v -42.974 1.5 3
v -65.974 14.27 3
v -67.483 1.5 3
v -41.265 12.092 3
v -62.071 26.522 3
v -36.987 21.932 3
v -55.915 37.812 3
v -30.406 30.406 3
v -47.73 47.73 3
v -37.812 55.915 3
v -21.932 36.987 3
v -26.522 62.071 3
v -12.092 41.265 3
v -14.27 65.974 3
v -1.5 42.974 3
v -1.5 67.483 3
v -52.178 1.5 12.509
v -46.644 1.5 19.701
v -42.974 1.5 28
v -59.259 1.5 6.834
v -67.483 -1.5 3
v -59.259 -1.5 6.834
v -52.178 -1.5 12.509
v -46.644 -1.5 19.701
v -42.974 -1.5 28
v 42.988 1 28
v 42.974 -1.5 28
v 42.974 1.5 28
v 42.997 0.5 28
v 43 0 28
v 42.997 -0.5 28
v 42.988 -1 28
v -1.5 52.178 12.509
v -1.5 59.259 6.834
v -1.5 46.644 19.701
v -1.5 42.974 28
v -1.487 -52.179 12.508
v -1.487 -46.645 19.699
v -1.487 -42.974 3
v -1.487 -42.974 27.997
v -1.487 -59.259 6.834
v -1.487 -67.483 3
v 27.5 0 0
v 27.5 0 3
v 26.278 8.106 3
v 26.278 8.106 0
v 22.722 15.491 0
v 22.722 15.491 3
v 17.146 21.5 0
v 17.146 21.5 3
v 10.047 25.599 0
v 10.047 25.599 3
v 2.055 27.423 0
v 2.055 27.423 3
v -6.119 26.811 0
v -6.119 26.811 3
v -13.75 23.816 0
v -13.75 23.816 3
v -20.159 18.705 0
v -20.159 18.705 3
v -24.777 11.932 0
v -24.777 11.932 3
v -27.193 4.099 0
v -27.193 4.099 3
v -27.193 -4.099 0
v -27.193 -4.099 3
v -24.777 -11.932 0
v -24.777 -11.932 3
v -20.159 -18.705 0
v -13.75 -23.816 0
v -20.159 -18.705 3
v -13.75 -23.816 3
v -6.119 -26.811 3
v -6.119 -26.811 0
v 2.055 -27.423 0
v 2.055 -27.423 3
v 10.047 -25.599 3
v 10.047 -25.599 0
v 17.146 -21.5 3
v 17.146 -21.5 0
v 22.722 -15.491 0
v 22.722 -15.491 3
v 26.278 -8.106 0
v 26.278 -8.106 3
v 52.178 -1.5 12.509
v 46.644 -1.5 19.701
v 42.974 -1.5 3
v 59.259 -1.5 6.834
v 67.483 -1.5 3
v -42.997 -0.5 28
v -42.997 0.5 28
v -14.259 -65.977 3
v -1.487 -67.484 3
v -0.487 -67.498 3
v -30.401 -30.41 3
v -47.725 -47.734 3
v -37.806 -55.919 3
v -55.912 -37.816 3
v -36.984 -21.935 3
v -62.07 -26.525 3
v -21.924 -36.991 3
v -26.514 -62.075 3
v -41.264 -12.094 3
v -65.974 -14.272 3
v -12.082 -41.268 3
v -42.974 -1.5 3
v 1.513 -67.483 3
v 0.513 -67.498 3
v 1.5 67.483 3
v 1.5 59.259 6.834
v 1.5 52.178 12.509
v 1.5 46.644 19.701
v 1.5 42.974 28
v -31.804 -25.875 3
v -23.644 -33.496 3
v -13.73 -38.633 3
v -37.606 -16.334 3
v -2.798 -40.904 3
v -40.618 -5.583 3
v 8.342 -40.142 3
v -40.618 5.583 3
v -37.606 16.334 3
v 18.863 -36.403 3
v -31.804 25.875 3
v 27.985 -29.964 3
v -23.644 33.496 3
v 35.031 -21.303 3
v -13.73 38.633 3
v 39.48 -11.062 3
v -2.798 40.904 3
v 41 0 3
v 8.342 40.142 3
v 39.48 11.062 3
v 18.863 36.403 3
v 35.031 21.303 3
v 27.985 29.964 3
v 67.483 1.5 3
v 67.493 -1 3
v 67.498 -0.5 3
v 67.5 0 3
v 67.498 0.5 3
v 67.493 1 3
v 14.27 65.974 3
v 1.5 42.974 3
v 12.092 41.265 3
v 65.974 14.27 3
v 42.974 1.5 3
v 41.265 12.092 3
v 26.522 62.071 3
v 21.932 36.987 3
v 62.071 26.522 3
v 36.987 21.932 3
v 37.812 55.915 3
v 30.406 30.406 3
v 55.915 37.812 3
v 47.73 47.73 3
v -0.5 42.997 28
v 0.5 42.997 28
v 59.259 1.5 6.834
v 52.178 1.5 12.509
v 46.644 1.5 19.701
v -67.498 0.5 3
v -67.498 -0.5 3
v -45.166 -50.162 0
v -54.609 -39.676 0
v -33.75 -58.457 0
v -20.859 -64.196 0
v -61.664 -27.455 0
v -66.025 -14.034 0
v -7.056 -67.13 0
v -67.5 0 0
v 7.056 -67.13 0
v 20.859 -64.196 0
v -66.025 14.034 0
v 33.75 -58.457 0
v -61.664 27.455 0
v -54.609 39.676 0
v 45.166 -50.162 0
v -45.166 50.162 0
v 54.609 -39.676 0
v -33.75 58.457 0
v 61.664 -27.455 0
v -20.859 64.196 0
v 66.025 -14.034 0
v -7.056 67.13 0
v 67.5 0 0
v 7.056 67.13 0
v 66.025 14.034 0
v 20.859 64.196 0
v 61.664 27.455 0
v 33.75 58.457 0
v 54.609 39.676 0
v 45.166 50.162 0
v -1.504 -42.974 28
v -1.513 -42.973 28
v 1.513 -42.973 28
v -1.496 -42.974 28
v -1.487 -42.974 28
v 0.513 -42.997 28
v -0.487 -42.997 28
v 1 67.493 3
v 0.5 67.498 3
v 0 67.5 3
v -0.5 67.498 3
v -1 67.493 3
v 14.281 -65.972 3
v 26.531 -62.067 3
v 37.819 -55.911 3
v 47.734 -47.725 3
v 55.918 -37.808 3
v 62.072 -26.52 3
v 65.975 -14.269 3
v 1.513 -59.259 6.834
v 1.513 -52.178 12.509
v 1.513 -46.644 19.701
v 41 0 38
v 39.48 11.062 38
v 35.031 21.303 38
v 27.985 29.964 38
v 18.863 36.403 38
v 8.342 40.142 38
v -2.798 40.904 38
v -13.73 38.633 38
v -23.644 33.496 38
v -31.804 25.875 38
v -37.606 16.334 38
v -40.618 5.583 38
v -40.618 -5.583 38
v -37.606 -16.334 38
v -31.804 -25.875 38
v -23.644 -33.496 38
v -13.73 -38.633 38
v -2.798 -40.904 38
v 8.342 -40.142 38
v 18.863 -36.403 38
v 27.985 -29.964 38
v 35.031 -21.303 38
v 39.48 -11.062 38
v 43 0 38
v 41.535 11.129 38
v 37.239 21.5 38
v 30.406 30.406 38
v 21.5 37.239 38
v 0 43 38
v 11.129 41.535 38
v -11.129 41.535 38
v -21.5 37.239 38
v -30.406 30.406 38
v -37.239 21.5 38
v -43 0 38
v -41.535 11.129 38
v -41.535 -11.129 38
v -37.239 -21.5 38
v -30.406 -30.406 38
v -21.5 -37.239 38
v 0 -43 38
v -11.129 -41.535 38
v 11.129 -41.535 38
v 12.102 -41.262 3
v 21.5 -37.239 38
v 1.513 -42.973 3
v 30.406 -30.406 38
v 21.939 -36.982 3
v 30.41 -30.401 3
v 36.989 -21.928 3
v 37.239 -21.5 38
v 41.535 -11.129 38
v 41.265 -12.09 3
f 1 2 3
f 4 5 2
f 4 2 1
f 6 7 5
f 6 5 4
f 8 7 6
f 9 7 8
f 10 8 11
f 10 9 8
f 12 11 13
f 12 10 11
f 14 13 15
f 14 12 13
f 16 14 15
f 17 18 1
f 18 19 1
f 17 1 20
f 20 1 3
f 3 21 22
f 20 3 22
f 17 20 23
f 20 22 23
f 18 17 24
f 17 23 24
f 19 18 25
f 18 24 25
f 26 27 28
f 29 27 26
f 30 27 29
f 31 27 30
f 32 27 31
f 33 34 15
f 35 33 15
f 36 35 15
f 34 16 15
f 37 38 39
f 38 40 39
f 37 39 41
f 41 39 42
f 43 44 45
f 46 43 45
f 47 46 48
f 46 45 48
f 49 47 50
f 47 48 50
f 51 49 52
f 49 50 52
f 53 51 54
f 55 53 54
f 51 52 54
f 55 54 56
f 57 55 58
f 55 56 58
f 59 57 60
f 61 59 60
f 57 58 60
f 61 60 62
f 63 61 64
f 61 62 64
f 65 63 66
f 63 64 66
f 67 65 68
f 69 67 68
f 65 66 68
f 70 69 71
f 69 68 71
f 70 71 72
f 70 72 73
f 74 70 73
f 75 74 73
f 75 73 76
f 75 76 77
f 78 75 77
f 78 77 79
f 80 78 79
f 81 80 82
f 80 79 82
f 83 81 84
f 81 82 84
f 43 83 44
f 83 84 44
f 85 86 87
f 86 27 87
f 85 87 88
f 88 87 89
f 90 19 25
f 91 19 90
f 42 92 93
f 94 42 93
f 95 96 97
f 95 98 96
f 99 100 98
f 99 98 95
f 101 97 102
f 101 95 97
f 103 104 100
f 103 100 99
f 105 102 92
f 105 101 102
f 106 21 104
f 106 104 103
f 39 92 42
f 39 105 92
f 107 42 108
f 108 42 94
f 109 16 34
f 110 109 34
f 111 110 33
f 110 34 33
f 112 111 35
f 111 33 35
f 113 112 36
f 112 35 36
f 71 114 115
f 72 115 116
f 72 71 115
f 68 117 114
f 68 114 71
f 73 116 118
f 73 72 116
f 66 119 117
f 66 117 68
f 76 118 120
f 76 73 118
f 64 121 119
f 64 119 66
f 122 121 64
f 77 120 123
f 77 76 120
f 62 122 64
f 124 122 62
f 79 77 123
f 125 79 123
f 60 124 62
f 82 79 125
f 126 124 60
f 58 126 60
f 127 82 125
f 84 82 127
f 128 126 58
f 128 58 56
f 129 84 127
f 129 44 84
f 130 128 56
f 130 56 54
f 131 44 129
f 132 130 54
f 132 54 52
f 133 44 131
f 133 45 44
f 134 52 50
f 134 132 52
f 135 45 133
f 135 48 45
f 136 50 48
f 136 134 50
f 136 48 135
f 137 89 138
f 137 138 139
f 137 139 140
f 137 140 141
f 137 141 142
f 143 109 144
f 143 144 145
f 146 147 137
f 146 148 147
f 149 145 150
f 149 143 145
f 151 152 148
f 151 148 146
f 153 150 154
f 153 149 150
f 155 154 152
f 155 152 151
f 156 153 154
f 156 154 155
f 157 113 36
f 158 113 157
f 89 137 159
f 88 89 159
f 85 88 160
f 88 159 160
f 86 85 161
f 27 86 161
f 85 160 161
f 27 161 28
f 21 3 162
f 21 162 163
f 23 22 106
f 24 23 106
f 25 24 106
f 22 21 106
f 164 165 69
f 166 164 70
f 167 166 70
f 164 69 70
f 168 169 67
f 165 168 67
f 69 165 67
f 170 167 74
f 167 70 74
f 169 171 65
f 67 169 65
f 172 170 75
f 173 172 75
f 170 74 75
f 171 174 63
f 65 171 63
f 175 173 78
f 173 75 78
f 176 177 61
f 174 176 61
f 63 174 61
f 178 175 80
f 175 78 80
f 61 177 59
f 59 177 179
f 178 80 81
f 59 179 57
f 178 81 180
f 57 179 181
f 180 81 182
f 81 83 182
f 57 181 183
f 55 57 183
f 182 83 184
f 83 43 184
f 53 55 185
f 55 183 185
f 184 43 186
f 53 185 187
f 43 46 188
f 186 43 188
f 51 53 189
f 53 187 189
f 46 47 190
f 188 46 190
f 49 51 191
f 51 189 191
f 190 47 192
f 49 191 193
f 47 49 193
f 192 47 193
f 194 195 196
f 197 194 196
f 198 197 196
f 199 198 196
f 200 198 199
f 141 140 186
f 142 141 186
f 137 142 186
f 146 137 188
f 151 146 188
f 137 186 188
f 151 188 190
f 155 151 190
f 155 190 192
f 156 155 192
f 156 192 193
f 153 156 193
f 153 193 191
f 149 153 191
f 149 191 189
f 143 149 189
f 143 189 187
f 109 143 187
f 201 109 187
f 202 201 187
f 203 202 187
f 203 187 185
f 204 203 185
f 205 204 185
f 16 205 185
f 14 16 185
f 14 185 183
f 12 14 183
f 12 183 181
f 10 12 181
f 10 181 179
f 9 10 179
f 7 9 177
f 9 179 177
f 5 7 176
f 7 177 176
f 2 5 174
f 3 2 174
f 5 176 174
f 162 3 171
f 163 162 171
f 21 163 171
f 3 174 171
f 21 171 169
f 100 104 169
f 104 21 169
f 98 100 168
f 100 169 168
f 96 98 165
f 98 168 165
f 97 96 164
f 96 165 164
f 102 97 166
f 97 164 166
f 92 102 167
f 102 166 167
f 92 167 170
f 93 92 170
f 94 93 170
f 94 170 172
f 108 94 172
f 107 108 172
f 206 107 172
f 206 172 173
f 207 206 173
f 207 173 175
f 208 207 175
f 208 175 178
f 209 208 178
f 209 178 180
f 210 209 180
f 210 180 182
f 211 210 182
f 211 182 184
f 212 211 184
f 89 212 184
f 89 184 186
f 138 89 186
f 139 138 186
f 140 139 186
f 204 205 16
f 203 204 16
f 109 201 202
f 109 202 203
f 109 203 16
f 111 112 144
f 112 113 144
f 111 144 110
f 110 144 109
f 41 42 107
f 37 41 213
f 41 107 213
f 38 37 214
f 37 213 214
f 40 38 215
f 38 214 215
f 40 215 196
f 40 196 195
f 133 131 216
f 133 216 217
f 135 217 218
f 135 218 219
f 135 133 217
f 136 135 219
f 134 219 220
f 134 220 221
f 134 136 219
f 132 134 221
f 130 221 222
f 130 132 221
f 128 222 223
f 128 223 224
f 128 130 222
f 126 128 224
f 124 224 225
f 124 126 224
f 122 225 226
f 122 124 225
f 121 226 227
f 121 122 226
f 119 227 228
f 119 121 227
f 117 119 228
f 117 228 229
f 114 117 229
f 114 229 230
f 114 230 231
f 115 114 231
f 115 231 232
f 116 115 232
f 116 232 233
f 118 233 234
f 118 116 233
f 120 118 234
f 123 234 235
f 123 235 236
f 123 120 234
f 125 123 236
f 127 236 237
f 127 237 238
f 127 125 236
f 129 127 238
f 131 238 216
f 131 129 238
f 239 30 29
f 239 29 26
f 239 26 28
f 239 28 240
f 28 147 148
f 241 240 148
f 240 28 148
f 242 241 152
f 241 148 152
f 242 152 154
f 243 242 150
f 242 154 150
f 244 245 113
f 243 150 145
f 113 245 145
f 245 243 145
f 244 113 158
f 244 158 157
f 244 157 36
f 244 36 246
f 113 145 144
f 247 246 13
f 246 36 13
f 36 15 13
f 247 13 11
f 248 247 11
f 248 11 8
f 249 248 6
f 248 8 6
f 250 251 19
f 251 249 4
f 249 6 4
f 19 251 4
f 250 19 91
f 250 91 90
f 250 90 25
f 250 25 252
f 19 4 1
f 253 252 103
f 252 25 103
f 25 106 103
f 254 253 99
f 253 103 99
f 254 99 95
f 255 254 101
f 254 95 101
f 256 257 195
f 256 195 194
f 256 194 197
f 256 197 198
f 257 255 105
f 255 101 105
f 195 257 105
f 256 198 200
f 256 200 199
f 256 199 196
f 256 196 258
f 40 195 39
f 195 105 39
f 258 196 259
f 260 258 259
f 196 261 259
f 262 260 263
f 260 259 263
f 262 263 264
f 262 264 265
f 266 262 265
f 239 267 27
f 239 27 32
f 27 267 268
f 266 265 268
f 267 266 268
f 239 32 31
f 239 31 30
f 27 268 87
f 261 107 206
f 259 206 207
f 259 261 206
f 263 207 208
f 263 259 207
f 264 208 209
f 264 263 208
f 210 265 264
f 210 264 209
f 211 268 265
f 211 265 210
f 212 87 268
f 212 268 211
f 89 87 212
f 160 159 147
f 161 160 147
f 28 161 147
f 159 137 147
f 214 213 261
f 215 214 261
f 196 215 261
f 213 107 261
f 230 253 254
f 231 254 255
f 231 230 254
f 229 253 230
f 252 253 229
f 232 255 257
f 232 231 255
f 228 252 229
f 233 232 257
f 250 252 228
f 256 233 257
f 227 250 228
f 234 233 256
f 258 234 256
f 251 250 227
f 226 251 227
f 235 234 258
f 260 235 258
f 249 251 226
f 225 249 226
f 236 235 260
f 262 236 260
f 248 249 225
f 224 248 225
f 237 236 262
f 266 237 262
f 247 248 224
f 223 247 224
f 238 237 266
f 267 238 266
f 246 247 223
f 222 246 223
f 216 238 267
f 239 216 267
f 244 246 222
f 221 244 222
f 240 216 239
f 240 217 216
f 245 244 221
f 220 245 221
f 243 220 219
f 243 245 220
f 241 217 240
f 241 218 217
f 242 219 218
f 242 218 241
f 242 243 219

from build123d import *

# Parameters (mm, degrees)
F0_R      = 67.5
F1_DEPTH  = 3
F2_R      = 43
F2_R_2    = 41
F3_DEPTH  = 35
F4_R      = 27.5
F5_DEPTH  = 3
F7_DEPTH  = 25
F12_DEPTH = 25
F13_DEPTH = 25
F14_DEPTH = 25
F15_DEPTH = 25
F16_DEPTH = 25


with BuildPart() as f1:
    # F0 (on Top) → F1 (new body)
    with BuildSketch(Plane.XY):
        Circle(F0_R)
    extrude(amount=F1_DEPTH)

    # F2 (on face) → F3 (join)
    with BuildSketch(Plane.XY.offset(3)):
        Circle(F2_R)
        Circle(F2_R_2, mode=Mode.SUBTRACT)
    extrude(amount=F3_DEPTH)

    # F4 (on face) → F5 (cut)
    with BuildSketch(Plane.XY.offset(3)):
        Circle(F4_R)
    extrude(amount=-F5_DEPTH, mode=Mode.SUBTRACT)

    # F6 (on face) → F7 (join)
    with BuildSketch(Plane.XY.offset(3)):
        with BuildLine():
            ThreePointArc((-1.4872706737, -67.4836130179), (0.0127324705, -67.4999987991), (1.5127293263, -67.4830471303))
            Line((1.5127293263, -67.4830471303), (1.5127293263, -42.973383041))
            ThreePointArc((1.5127293263, -42.973383041), (0.0127370783, -42.9999981136), (-1.4872706737, -42.9742716744))
            Line((-1.4872706737, -42.9742716744), (-1.4872706737, -67.4836130179))
        make_face()
        with BuildLine():
            Line((67.4833312752, -1.5), (67.4833312752, 1.5))
            Line((67.4833312752, 1.5), (42.9738292453, 1.5))
            ThreePointArc((42.9738292453, 1.5), (42.9934568135, 0.7501141427), (43, 0))
            ThreePointArc((43, 0), (42.9934568135, -0.7501141427), (42.9738292453, -1.5))
            Line((42.9738292453, -1.5), (67.4833312752, -1.5))
        make_face()
        with BuildLine():
            Line((-42.9738292453, 1.5), (-67.4833312752, 1.5))
            Line((-67.4833312752, 1.5), (-67.4833312752, -1.5))
            Line((-67.4833312752, -1.5), (-42.9738292453, -1.5))
            ThreePointArc((-42.9738292453, -1.5), (-43, 0), (-42.9738292453, 1.5))
        make_face()
        with BuildLine():
            ThreePointArc((1.5, 67.4833312752), (0.7500463063, 67.4958326902), (0, 67.5))
            ThreePointArc((0, 67.5), (-0.7500463063, 67.4958326902), (-1.5, 67.4833312752))
            Line((-1.5, 67.4833312752), (-1.5, 42.9738292453))
            ThreePointArc((-1.5, 42.9738292453), (0, 43), (1.5, 42.9738292453))
            Line((1.5, 42.9738292453), (1.5, 67.4833312752))
        make_face()
    extrude(amount=F7_DEPTH)

    # F11 (on face) → F12 (cut)
    with BuildSketch(Plane.YZ.offset(1.5127293263)):
        with BuildLine():
            Line((-67.4830471303, 28), (-67.4830471303, 3))
            ThreePointArc((-67.4830471303, 3), (-52.1775932535, 12.5092113453), (-42.973383041, 28))
            Line((-42.973383041, 28), (-67.4830471303, 28))
        make_face()
    extrude(amount=-F12_DEPTH, mode=Mode.SUBTRACT)

    # F8 (on face) → F13 (cut)
    with BuildSketch(Plane(origin=(0, 1.5, 0), x_dir=(-1, 0, 0), z_dir=(0, 1, 0))):
        with BuildLine():
            Line((-67.4833312752, 28), (-67.4833312752, 3))
            ThreePointArc((-67.4833312752, 3), (-52.177969566, 12.5092420399), (-42.9738292453, 28))
            Line((-42.9738292453, 28), (-67.4833312752, 28))
        make_face()
    extrude(amount=-F13_DEPTH, mode=Mode.SUBTRACT)

    # F9 (on face) → F14 (cut)
    with BuildSketch(Plane(origin=(-1.5, 0, 0), x_dir=(0, -1, 0), z_dir=(-1, 0, 0))):
        with BuildLine():
            Line((-67.4833312752, 28), (-67.4833312752, 3))
            ThreePointArc((-67.4833312752, 3), (-52.177969566, 12.5092420399), (-42.9738292453, 28))
            Line((-42.9738292453, 28), (-67.4833312752, 28))
        make_face()
    extrude(amount=-F14_DEPTH, mode=Mode.SUBTRACT)

    # F10 (on face) → F15 (cut)
    with BuildSketch(Plane.XZ.offset(1.5)):
        with BuildLine():
            Line((-67.4833312752, 28), (-67.4833312752, 3))
            ThreePointArc((-67.4833312752, 3), (-52.177969566, 12.5092420399), (-42.9738292453, 28))
            Line((-42.9738292453, 28), (-67.4833312752, 28))
        make_face()
    extrude(amount=-F15_DEPTH, mode=Mode.SUBTRACT)

    # F16 (cut, through all): faces of the model
    f16_faces = [f1.faces().sort_by_distance(p)[0] for p in [
        (0, 67.4899988357, 28),
        (0.0003160568, -67.4898297441, 28),
        (0, 67.4899988357, 28),
        (0.0003160568, -67.4898297441, 28),
    ]]
    extrude(f16_faces, amount=-F16_DEPTH, mode=Mode.SUBTRACT)


solid = f1.part
